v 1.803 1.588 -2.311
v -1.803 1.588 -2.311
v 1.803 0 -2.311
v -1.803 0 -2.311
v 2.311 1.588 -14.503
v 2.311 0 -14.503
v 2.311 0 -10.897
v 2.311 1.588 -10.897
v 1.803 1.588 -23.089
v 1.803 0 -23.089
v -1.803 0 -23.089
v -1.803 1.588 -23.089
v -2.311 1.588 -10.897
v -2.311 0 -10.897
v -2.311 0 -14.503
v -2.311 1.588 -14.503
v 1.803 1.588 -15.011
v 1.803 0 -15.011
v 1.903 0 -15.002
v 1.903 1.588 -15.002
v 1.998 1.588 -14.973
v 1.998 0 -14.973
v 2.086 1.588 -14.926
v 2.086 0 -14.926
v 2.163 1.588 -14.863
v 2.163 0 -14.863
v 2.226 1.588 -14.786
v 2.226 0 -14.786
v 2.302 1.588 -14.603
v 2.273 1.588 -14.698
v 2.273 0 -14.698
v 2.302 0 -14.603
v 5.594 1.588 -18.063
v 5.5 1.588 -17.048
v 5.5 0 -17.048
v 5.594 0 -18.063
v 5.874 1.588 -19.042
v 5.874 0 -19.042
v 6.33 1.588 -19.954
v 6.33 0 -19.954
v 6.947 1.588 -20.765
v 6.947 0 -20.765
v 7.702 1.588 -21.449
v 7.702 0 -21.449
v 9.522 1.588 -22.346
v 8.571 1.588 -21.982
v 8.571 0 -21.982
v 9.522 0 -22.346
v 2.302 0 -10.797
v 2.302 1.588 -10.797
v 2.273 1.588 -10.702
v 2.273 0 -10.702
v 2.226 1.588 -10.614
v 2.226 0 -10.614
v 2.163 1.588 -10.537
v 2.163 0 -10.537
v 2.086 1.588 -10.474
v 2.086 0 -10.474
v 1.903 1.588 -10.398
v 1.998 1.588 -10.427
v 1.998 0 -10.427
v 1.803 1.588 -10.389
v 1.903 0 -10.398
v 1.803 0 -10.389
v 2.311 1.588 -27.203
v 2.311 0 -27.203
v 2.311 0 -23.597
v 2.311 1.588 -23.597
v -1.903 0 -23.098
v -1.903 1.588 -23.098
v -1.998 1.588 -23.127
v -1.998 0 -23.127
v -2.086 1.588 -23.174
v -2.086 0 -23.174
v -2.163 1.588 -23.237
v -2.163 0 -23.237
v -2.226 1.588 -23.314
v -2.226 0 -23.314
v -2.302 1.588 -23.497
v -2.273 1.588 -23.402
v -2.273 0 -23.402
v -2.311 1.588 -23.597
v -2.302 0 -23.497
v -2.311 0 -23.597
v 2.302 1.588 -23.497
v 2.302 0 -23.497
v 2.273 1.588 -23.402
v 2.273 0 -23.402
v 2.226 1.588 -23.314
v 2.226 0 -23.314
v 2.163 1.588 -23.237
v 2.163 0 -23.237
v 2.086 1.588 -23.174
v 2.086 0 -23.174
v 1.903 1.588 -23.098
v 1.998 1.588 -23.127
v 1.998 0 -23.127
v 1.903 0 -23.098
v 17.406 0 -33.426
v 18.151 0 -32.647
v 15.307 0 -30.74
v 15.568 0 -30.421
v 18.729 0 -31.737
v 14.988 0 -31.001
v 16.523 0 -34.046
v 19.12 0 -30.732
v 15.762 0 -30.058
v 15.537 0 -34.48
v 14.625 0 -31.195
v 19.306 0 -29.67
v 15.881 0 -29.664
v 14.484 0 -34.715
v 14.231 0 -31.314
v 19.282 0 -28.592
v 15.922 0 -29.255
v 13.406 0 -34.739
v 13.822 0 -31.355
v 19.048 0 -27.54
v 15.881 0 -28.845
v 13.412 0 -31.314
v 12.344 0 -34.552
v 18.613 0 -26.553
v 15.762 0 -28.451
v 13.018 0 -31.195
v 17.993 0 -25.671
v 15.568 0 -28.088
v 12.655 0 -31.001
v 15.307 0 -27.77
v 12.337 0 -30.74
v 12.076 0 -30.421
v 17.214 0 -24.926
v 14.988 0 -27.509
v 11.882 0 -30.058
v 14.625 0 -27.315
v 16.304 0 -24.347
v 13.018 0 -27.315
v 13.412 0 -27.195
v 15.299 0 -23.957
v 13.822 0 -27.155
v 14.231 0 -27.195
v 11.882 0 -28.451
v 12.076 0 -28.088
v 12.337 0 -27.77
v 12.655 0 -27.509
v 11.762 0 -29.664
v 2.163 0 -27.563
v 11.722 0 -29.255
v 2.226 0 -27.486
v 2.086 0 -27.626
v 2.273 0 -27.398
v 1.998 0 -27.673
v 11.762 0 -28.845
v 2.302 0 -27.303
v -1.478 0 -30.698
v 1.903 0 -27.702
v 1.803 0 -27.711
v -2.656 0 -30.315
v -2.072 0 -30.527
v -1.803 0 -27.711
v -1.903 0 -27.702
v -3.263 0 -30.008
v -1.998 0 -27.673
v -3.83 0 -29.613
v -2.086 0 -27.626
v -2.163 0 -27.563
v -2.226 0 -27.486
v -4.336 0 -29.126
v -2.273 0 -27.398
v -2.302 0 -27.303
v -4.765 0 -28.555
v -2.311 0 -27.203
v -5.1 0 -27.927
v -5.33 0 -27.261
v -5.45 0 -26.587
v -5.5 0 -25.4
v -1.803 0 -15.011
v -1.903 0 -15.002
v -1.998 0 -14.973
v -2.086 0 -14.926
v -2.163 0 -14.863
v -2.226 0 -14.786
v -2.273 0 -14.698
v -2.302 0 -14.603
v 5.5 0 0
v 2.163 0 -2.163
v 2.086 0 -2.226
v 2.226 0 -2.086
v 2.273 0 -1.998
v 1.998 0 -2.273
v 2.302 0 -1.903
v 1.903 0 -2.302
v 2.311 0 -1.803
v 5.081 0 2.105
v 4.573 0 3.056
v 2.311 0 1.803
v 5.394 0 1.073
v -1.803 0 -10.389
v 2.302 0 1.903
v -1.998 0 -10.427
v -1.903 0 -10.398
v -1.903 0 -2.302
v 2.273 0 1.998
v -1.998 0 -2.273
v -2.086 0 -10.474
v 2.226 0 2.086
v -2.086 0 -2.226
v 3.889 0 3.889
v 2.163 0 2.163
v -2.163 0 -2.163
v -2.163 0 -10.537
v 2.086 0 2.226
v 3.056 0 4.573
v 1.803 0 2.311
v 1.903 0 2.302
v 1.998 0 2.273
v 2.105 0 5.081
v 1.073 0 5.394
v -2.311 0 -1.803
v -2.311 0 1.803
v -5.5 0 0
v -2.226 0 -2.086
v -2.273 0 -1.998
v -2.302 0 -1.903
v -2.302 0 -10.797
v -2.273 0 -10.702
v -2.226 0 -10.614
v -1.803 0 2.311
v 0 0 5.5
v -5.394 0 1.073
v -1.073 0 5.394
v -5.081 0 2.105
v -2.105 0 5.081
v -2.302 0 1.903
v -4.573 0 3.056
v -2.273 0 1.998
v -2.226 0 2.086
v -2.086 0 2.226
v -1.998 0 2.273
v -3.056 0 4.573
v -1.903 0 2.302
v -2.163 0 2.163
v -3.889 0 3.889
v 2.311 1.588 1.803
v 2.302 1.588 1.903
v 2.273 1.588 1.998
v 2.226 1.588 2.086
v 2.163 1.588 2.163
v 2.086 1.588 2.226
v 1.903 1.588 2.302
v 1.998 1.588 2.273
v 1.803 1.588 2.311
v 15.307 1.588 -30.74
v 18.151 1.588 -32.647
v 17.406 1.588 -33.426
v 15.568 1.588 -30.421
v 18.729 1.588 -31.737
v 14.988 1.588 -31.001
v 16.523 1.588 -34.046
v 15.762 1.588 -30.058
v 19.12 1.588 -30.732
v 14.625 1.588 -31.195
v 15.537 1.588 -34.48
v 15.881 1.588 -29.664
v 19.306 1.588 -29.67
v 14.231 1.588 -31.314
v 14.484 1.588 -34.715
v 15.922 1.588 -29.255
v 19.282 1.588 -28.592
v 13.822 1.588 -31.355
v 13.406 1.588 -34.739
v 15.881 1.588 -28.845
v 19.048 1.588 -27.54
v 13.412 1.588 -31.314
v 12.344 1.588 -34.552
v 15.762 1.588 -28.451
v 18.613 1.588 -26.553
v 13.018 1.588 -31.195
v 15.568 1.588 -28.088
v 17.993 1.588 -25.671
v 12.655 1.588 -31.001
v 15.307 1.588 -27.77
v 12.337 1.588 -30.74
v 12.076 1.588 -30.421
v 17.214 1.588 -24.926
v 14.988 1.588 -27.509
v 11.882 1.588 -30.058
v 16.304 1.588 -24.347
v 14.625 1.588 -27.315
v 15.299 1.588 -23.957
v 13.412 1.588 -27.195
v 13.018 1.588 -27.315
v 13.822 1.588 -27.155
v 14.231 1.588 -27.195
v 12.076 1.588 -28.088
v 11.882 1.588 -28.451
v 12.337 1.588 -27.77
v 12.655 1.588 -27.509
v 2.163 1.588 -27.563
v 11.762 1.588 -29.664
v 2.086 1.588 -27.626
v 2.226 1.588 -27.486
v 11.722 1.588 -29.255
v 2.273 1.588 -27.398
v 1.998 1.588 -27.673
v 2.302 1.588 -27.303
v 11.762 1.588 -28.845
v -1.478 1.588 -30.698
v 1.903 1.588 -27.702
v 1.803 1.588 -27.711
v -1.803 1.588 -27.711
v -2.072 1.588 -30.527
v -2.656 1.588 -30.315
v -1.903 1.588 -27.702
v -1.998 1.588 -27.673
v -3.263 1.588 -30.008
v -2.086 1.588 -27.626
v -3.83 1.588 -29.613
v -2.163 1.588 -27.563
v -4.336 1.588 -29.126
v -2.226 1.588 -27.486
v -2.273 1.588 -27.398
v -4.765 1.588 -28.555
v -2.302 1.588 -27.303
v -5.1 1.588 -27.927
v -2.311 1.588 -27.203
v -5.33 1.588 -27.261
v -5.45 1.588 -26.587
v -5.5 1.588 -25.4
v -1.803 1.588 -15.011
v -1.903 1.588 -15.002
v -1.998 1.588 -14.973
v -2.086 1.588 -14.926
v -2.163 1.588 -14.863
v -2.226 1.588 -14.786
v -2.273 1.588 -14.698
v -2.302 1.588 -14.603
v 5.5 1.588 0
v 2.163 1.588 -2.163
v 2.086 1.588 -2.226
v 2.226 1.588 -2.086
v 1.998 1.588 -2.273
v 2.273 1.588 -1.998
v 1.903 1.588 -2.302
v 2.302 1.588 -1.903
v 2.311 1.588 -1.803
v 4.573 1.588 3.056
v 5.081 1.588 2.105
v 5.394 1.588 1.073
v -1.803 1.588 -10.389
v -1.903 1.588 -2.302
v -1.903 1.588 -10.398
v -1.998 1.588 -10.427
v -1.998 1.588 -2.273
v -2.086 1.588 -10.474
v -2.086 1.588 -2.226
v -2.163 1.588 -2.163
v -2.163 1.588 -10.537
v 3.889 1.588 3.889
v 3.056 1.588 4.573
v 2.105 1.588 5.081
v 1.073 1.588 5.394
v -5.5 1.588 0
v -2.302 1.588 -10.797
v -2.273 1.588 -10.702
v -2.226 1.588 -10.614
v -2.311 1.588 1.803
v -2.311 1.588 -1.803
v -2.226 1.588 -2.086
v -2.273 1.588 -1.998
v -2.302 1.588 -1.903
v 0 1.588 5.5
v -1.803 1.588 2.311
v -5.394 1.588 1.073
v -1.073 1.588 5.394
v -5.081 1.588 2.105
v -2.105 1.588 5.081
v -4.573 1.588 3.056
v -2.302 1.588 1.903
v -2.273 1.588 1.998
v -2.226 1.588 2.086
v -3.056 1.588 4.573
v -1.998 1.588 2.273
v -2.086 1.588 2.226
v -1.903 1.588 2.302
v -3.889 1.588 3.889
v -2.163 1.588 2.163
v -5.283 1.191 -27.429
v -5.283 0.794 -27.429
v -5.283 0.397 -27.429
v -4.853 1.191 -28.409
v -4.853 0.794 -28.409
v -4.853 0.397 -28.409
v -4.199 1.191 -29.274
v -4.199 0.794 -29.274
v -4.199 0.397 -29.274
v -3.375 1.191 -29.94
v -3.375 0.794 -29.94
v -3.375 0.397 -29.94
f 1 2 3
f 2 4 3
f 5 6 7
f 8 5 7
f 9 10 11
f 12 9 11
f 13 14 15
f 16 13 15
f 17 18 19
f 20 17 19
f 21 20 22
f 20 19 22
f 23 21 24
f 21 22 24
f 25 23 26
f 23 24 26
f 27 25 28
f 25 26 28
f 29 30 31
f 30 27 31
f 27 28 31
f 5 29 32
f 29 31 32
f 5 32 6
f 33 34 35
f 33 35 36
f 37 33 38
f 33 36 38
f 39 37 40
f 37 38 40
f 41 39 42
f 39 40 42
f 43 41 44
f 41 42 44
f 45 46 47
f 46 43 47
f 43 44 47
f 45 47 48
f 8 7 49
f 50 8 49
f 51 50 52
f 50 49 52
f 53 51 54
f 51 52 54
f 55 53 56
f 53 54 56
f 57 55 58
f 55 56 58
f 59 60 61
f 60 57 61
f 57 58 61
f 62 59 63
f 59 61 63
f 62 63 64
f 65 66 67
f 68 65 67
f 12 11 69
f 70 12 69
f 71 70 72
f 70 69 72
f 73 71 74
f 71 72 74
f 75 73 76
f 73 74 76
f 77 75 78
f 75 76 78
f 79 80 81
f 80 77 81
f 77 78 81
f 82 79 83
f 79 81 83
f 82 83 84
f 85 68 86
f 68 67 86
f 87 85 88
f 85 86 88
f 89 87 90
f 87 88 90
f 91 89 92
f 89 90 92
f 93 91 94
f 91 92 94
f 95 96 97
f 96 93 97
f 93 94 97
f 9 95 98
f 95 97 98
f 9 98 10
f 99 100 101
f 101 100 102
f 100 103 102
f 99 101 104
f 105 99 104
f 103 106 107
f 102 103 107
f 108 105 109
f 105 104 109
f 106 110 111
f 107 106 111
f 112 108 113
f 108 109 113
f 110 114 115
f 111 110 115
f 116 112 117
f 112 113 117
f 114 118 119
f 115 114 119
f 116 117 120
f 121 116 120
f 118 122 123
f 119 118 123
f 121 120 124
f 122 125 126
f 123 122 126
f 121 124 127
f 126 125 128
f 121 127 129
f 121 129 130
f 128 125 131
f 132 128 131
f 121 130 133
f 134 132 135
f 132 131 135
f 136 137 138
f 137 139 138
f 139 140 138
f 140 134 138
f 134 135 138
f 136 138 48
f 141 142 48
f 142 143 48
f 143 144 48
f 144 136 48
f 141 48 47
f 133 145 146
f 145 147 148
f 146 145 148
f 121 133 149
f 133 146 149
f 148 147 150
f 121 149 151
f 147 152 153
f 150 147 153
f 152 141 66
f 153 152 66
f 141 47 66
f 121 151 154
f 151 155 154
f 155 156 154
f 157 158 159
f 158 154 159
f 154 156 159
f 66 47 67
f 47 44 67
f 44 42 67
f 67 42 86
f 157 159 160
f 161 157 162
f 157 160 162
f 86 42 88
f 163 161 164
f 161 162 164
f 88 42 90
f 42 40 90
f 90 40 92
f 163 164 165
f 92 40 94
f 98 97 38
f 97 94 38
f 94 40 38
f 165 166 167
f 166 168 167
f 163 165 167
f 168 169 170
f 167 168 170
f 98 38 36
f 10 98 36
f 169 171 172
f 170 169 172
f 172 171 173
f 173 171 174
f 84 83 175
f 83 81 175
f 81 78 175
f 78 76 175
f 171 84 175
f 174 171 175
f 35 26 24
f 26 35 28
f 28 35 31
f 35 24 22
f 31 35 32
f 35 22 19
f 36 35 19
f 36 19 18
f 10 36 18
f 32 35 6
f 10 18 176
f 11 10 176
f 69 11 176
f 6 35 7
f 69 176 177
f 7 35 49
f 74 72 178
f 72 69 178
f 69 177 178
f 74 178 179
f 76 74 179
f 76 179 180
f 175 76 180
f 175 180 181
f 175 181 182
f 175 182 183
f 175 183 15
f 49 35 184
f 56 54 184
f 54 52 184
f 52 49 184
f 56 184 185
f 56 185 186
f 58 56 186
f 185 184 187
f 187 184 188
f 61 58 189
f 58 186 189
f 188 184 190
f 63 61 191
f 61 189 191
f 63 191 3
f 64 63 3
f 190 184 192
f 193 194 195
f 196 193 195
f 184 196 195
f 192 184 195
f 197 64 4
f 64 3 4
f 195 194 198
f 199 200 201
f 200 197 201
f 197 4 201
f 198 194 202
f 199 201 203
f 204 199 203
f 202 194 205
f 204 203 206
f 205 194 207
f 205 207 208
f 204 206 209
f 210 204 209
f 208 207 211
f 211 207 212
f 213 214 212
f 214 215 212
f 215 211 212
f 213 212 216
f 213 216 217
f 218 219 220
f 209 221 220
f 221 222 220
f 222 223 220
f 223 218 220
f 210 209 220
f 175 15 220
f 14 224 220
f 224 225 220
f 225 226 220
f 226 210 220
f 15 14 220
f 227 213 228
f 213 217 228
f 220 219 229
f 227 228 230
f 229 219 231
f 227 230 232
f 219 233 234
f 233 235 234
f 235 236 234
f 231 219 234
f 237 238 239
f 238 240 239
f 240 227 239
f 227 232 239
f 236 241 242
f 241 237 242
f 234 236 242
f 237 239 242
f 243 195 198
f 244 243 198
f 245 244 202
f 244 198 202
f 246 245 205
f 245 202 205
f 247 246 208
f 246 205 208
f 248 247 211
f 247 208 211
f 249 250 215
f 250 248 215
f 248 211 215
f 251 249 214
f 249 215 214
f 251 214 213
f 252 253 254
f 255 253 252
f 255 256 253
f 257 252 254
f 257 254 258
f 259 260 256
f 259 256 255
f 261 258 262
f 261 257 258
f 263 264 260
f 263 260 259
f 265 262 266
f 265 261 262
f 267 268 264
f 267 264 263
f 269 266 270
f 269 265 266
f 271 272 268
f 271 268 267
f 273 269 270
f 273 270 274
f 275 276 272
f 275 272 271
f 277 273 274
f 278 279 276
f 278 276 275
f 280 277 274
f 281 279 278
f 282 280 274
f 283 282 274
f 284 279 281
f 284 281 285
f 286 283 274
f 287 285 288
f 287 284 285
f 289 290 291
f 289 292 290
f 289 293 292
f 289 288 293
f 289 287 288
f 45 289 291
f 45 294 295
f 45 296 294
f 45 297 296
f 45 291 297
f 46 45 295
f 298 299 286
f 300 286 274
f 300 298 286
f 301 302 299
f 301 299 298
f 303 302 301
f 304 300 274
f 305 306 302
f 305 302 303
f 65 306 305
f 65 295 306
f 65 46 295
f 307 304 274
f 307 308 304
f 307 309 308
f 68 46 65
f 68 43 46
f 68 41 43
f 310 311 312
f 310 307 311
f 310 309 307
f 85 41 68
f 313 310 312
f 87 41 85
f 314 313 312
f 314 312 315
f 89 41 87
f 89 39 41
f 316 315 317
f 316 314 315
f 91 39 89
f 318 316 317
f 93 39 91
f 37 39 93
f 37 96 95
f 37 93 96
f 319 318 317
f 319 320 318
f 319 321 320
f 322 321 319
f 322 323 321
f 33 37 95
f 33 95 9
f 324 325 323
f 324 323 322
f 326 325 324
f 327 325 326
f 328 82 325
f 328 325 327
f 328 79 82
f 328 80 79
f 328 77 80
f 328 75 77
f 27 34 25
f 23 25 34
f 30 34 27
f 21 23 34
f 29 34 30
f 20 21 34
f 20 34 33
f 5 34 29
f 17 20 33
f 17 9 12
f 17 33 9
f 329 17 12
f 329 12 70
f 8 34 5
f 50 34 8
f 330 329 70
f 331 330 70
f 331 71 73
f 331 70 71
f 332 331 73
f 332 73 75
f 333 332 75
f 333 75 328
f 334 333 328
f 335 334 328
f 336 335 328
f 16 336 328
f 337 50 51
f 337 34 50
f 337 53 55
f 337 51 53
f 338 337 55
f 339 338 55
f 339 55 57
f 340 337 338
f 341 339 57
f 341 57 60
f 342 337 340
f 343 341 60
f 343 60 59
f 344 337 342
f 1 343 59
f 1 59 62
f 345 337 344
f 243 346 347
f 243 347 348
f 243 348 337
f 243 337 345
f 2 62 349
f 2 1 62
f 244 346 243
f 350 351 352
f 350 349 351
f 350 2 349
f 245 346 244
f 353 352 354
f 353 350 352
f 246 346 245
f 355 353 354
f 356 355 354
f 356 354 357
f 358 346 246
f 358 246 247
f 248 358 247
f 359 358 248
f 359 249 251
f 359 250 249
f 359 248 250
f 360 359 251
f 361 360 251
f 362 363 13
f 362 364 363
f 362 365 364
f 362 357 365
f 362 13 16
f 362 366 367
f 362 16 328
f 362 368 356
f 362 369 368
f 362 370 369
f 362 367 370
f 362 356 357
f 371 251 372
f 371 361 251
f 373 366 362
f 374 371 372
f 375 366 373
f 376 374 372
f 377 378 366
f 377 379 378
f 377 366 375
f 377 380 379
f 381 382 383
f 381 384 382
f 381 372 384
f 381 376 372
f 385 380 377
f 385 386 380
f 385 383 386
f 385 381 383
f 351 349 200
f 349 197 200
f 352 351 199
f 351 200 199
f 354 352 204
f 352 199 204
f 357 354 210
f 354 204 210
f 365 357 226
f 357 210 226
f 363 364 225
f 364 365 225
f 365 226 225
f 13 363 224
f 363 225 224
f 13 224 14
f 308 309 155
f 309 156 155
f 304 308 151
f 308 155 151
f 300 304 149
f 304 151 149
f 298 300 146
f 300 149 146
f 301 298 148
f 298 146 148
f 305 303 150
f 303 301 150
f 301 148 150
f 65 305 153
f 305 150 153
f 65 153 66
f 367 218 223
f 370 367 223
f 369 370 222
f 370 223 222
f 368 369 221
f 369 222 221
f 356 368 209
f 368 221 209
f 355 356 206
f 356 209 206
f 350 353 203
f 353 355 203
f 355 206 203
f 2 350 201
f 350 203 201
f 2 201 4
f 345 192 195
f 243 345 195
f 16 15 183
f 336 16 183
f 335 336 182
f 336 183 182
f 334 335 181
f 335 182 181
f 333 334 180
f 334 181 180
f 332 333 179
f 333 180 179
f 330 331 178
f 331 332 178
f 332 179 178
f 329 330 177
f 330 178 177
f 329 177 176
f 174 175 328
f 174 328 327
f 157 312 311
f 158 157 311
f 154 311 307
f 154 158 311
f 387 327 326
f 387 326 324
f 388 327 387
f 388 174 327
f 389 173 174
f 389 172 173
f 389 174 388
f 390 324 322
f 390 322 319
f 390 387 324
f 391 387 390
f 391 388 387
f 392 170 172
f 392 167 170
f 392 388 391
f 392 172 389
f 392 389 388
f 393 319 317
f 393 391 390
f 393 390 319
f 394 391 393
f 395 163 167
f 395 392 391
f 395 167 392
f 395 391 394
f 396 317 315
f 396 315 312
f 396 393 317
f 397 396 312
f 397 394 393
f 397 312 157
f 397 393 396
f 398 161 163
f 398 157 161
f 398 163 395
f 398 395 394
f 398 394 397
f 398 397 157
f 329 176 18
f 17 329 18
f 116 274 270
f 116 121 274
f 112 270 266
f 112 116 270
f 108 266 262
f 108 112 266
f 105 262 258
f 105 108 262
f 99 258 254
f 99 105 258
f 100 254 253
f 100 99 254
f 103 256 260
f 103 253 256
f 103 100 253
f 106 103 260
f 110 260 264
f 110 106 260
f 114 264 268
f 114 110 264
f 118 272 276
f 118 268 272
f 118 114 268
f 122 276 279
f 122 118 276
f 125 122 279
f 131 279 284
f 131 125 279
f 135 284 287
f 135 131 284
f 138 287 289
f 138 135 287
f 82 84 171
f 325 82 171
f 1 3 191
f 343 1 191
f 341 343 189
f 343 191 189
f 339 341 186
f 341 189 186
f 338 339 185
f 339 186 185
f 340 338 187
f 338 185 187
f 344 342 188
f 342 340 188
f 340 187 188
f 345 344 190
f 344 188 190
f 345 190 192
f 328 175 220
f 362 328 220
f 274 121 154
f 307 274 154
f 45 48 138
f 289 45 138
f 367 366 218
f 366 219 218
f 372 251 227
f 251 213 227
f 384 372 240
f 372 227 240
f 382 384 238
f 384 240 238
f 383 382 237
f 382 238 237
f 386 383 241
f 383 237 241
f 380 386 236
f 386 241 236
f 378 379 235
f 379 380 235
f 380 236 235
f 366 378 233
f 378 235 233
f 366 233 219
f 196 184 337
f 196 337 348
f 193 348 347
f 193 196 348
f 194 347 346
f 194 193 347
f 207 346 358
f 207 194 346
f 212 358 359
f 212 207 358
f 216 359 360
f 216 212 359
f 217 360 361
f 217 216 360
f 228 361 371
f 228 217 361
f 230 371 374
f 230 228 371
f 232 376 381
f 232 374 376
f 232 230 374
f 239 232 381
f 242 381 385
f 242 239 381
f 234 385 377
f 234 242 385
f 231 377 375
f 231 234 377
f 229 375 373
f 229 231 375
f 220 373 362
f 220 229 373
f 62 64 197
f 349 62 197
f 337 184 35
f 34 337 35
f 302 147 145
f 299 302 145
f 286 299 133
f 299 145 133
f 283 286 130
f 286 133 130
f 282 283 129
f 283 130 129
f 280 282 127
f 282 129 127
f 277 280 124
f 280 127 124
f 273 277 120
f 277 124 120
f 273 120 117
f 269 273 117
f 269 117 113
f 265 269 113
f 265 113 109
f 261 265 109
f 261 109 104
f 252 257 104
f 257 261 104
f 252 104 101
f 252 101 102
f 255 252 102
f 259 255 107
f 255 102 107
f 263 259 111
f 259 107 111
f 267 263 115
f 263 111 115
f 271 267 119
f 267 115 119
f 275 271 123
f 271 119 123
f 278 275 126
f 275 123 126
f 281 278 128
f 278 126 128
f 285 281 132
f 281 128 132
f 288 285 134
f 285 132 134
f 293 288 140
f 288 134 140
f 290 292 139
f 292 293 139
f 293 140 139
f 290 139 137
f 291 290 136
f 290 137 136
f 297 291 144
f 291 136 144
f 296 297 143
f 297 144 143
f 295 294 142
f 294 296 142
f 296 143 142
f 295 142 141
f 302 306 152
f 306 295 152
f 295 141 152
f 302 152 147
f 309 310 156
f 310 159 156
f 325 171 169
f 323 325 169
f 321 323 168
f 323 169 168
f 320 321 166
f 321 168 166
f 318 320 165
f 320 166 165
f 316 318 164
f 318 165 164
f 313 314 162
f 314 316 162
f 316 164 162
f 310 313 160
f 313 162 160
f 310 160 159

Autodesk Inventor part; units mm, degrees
ref_plane "YZ Plane" through (0, 0, 0) normal (1, 0, 0) x (0, 1, 0)
ref_plane "XZ Plane" through (0, 0, 0) normal (0, 1, 0) x (-1, 0, 0)
ref_plane "XY Plane" through (0, 0, 0) normal (0, 0, 1) x (1, 0, 0)
sketch "main" plane through (0, 0, 0) normal (0, 0, 1) x (1, 0, 0)
  line L0 (-3.1973, -8.3156) -> (0.4095, -8.3156)
  arc A0 (-3.1973, -8.3156) -> (-3.7053, -8.8236) centre (-3.1973, -8.8236) ccw
  arc A1 (0.9175, -8.8236) -> (0.4095, -8.3156) centre (0.4095, -8.8236) ccw
  line L1 (-3.7053, -12.4304) -> (-3.7053, -8.8236)
  line L2 (0.9175, -8.8236) -> (0.9175, -12.4304)
  arc A2 (-3.7053, -12.4304) -> (-3.1973, -12.9384) centre (-3.1973, -12.4304) ccw
  line L3 (0.4095, -12.9384) -> (-3.1973, -12.9384)
  arc A3 (0.4095, -12.9384) -> (0.9175, -12.4304) centre (0.4095, -12.4304) ccw
  spline S0 degree 3 poles (4.1061, -10.627) (4.1061, -11.3073) (4.0733, -12.6645) (2.9205, -14.6469) (1.3832, -15.5703) (0.4113, -15.8334) (0.0836, -15.9248) knots 0 0 0 0 0.294694 0.589389 0.884083 1.03143 1.03143 1.03143 1.03143
  arc A4 (-10.9164, -7.5728) -> (-6.8939, -2.275) centre (-12.3939, -2.275) ccw
  line L4 (-13.7381, -19.7795) -> (0.0836, -15.9248)
  line L5 (-10.9164, -7.5728) -> (-16.6931, -9.1839)
  arc A5 (-16.6931, -9.1839) -> (-13.7381, -19.7795) centre (-15.2156, -14.4817) ccw
  circle A6 centre (-15.2156, -14.4817) radius 2.1
  line L6 (0.4095, -0.2384) -> (-3.1973, -0.2384)
  arc A7 (-3.7053, 0.2696) -> (-3.1973, -0.2384) centre (-3.1973, 0.2696) ccw
  line L7 (0.9175, 3.8764) -> (0.9175, 0.2696)
  line L8 (-3.7053, 0.2696) -> (-3.7053, 3.8764)
  line L9 (-3.1973, 4.3844) -> (0.4095, 4.3844)
  arc A8 (-3.1973, 4.3844) -> (-3.7053, 3.8764) centre (-3.1973, 3.8764) ccw
  arc A9 (0.9175, 3.8764) -> (0.4095, 4.3844) centre (0.4095, 3.8764) ccw
  arc A10 (0.4095, -0.2384) -> (0.9175, 0.2696) centre (0.4095, 0.2696) ccw
  line L10 (4.1061, -10.627) -> (4.1061, 14.773)
  arc A11 (4.1061, 14.773) -> (-6.8939, 14.773) centre (-1.3939, 14.773) ccw
  line L11 (-6.8939, 14.773) -> (-6.8939, -2.275)
  line L12 (0.4095, 12.4616) -> (-3.1973, 12.4616)
  arc A12 (0.4095, 12.4616) -> (0.9175, 12.9696) centre (0.4095, 12.9696) ccw
  arc A13 (-3.7053, 12.9696) -> (-3.1973, 12.4616) centre (-3.1973, 12.9696) ccw
  line L13 (0.9175, 16.5764) -> (0.9175, 12.9696)
  line L14 (-3.7053, 12.9696) -> (-3.7053, 16.5764)
  arc A14 (-3.1973, 17.0844) -> (-3.7053, 16.5764) centre (-3.1973, 16.5764) ccw
  arc A15 (0.9175, 16.5764) -> (0.4095, 17.0844) centre (0.4095, 16.5764) ccw
  line L15 (-3.1973, 17.0844) -> (0.4095, 17.0844)
  point P0 (-2.9609, 0.4438)
  point P1 (-20.5005, 14.8552)
sketch "Sketch1" plane through (0, 0, 0) normal (0, 1, 0) x (-1, 0, 0)
  line L0 (-1.8034, -23.0886) -> (1.8034, -23.0886)
  arc A0 (-1.8034, -23.0886) -> (-2.3114, -23.5966) centre (-1.8034, -23.5966) ccw
  arc A1 (2.3114, -23.5966) -> (1.8034, -23.0886) centre (1.8034, -23.5966) ccw
  line L1 (-2.3114, -27.2034) -> (-2.3114, -23.5966)
  line L2 (2.3114, -23.5966) -> (2.3114, -27.2034)
  arc A2 (-2.3114, -27.2034) -> (-1.8034, -27.7114) centre (-1.8034, -27.2034) ccw
  line L3 (1.8034, -27.7114) -> (-1.8034, -27.7114)
  arc A3 (1.8034, -27.7114) -> (2.3114, -27.2034) centre (1.8034, -27.2034) ccw
  spline S0 degree 3 poles (5.5, -25.4) (5.5, -26.0803) (5.4672, -27.4376) (4.3143, -29.4199) (2.7771, -30.3433) (1.8052, -30.6064) (1.4775, -30.6978) knots 0 0 0 0 0.294694 0.589389 0.884083 1.03143 1.03143 1.03143 1.03143
  arc A4 (-9.5225, -22.3458) -> (-5.5, -17.048) centre (-11, -17.048) ccw
  line L4 (-12.3443, -34.5525) -> (1.4775, -30.6978)
  line L5 (-9.5225, -22.3458) -> (-15.2992, -23.9569)
  arc A5 (-15.2992, -23.9569) -> (-12.3443, -34.5525) centre (-13.8217, -29.2547) ccw
  circle A6 centre (-13.8217, -29.2547) radius 2.1
  line L6 (1.8034, -15.0114) -> (-1.8034, -15.0114)
  arc A7 (-2.3114, -14.5034) -> (-1.8034, -15.0114) centre (-1.8034, -14.5034) ccw
  line L7 (2.3114, -10.8966) -> (2.3114, -14.5034)
  line L8 (-2.3114, -14.5034) -> (-2.3114, -10.8966)
  line L9 (-1.8034, -10.3886) -> (1.8034, -10.3886)
  arc A8 (-1.8034, -10.3886) -> (-2.3114, -10.8966) centre (-1.8034, -10.8966) ccw
  arc A9 (2.3114, -10.8966) -> (1.8034, -10.3886) centre (1.8034, -10.8966) ccw
  arc A10 (1.8034, -15.0114) -> (2.3114, -14.5034) centre (1.8034, -14.5034) ccw
  line L10 (5.5, -25.4) -> (5.5, 0)
  arc A11 (5.5, 0) -> (-5.5, 0) centre (0, 0) ccw
  line L11 (-5.5, 0) -> (-5.5, -17.048)
  line L12 (1.8034, -2.3114) -> (-1.8034, -2.3114)
  arc A12 (1.8034, -2.3114) -> (2.3114, -1.8034) centre (1.8034, -1.8034) ccw
  arc A13 (-2.3114, -1.8034) -> (-1.8034, -2.3114) centre (-1.8034, -1.8034) ccw
  line L13 (2.3114, 1.8034) -> (2.3114, -1.8034)
  line L14 (-2.3114, -1.8034) -> (-2.3114, 1.8034)
  arc A14 (-1.8034, 2.3114) -> (-2.3114, 1.8034) centre (-1.8034, 1.8034) ccw
  arc A15 (2.3114, 1.8034) -> (1.8034, 2.3114) centre (1.8034, 1.8034) ccw
  line L15 (-1.8034, 2.3114) -> (1.8034, 2.3114)
extrude "Extrusion1" add sketch "Sketch1" along normal blind 1.5875
properties part number "bent_gusset_nesting"
